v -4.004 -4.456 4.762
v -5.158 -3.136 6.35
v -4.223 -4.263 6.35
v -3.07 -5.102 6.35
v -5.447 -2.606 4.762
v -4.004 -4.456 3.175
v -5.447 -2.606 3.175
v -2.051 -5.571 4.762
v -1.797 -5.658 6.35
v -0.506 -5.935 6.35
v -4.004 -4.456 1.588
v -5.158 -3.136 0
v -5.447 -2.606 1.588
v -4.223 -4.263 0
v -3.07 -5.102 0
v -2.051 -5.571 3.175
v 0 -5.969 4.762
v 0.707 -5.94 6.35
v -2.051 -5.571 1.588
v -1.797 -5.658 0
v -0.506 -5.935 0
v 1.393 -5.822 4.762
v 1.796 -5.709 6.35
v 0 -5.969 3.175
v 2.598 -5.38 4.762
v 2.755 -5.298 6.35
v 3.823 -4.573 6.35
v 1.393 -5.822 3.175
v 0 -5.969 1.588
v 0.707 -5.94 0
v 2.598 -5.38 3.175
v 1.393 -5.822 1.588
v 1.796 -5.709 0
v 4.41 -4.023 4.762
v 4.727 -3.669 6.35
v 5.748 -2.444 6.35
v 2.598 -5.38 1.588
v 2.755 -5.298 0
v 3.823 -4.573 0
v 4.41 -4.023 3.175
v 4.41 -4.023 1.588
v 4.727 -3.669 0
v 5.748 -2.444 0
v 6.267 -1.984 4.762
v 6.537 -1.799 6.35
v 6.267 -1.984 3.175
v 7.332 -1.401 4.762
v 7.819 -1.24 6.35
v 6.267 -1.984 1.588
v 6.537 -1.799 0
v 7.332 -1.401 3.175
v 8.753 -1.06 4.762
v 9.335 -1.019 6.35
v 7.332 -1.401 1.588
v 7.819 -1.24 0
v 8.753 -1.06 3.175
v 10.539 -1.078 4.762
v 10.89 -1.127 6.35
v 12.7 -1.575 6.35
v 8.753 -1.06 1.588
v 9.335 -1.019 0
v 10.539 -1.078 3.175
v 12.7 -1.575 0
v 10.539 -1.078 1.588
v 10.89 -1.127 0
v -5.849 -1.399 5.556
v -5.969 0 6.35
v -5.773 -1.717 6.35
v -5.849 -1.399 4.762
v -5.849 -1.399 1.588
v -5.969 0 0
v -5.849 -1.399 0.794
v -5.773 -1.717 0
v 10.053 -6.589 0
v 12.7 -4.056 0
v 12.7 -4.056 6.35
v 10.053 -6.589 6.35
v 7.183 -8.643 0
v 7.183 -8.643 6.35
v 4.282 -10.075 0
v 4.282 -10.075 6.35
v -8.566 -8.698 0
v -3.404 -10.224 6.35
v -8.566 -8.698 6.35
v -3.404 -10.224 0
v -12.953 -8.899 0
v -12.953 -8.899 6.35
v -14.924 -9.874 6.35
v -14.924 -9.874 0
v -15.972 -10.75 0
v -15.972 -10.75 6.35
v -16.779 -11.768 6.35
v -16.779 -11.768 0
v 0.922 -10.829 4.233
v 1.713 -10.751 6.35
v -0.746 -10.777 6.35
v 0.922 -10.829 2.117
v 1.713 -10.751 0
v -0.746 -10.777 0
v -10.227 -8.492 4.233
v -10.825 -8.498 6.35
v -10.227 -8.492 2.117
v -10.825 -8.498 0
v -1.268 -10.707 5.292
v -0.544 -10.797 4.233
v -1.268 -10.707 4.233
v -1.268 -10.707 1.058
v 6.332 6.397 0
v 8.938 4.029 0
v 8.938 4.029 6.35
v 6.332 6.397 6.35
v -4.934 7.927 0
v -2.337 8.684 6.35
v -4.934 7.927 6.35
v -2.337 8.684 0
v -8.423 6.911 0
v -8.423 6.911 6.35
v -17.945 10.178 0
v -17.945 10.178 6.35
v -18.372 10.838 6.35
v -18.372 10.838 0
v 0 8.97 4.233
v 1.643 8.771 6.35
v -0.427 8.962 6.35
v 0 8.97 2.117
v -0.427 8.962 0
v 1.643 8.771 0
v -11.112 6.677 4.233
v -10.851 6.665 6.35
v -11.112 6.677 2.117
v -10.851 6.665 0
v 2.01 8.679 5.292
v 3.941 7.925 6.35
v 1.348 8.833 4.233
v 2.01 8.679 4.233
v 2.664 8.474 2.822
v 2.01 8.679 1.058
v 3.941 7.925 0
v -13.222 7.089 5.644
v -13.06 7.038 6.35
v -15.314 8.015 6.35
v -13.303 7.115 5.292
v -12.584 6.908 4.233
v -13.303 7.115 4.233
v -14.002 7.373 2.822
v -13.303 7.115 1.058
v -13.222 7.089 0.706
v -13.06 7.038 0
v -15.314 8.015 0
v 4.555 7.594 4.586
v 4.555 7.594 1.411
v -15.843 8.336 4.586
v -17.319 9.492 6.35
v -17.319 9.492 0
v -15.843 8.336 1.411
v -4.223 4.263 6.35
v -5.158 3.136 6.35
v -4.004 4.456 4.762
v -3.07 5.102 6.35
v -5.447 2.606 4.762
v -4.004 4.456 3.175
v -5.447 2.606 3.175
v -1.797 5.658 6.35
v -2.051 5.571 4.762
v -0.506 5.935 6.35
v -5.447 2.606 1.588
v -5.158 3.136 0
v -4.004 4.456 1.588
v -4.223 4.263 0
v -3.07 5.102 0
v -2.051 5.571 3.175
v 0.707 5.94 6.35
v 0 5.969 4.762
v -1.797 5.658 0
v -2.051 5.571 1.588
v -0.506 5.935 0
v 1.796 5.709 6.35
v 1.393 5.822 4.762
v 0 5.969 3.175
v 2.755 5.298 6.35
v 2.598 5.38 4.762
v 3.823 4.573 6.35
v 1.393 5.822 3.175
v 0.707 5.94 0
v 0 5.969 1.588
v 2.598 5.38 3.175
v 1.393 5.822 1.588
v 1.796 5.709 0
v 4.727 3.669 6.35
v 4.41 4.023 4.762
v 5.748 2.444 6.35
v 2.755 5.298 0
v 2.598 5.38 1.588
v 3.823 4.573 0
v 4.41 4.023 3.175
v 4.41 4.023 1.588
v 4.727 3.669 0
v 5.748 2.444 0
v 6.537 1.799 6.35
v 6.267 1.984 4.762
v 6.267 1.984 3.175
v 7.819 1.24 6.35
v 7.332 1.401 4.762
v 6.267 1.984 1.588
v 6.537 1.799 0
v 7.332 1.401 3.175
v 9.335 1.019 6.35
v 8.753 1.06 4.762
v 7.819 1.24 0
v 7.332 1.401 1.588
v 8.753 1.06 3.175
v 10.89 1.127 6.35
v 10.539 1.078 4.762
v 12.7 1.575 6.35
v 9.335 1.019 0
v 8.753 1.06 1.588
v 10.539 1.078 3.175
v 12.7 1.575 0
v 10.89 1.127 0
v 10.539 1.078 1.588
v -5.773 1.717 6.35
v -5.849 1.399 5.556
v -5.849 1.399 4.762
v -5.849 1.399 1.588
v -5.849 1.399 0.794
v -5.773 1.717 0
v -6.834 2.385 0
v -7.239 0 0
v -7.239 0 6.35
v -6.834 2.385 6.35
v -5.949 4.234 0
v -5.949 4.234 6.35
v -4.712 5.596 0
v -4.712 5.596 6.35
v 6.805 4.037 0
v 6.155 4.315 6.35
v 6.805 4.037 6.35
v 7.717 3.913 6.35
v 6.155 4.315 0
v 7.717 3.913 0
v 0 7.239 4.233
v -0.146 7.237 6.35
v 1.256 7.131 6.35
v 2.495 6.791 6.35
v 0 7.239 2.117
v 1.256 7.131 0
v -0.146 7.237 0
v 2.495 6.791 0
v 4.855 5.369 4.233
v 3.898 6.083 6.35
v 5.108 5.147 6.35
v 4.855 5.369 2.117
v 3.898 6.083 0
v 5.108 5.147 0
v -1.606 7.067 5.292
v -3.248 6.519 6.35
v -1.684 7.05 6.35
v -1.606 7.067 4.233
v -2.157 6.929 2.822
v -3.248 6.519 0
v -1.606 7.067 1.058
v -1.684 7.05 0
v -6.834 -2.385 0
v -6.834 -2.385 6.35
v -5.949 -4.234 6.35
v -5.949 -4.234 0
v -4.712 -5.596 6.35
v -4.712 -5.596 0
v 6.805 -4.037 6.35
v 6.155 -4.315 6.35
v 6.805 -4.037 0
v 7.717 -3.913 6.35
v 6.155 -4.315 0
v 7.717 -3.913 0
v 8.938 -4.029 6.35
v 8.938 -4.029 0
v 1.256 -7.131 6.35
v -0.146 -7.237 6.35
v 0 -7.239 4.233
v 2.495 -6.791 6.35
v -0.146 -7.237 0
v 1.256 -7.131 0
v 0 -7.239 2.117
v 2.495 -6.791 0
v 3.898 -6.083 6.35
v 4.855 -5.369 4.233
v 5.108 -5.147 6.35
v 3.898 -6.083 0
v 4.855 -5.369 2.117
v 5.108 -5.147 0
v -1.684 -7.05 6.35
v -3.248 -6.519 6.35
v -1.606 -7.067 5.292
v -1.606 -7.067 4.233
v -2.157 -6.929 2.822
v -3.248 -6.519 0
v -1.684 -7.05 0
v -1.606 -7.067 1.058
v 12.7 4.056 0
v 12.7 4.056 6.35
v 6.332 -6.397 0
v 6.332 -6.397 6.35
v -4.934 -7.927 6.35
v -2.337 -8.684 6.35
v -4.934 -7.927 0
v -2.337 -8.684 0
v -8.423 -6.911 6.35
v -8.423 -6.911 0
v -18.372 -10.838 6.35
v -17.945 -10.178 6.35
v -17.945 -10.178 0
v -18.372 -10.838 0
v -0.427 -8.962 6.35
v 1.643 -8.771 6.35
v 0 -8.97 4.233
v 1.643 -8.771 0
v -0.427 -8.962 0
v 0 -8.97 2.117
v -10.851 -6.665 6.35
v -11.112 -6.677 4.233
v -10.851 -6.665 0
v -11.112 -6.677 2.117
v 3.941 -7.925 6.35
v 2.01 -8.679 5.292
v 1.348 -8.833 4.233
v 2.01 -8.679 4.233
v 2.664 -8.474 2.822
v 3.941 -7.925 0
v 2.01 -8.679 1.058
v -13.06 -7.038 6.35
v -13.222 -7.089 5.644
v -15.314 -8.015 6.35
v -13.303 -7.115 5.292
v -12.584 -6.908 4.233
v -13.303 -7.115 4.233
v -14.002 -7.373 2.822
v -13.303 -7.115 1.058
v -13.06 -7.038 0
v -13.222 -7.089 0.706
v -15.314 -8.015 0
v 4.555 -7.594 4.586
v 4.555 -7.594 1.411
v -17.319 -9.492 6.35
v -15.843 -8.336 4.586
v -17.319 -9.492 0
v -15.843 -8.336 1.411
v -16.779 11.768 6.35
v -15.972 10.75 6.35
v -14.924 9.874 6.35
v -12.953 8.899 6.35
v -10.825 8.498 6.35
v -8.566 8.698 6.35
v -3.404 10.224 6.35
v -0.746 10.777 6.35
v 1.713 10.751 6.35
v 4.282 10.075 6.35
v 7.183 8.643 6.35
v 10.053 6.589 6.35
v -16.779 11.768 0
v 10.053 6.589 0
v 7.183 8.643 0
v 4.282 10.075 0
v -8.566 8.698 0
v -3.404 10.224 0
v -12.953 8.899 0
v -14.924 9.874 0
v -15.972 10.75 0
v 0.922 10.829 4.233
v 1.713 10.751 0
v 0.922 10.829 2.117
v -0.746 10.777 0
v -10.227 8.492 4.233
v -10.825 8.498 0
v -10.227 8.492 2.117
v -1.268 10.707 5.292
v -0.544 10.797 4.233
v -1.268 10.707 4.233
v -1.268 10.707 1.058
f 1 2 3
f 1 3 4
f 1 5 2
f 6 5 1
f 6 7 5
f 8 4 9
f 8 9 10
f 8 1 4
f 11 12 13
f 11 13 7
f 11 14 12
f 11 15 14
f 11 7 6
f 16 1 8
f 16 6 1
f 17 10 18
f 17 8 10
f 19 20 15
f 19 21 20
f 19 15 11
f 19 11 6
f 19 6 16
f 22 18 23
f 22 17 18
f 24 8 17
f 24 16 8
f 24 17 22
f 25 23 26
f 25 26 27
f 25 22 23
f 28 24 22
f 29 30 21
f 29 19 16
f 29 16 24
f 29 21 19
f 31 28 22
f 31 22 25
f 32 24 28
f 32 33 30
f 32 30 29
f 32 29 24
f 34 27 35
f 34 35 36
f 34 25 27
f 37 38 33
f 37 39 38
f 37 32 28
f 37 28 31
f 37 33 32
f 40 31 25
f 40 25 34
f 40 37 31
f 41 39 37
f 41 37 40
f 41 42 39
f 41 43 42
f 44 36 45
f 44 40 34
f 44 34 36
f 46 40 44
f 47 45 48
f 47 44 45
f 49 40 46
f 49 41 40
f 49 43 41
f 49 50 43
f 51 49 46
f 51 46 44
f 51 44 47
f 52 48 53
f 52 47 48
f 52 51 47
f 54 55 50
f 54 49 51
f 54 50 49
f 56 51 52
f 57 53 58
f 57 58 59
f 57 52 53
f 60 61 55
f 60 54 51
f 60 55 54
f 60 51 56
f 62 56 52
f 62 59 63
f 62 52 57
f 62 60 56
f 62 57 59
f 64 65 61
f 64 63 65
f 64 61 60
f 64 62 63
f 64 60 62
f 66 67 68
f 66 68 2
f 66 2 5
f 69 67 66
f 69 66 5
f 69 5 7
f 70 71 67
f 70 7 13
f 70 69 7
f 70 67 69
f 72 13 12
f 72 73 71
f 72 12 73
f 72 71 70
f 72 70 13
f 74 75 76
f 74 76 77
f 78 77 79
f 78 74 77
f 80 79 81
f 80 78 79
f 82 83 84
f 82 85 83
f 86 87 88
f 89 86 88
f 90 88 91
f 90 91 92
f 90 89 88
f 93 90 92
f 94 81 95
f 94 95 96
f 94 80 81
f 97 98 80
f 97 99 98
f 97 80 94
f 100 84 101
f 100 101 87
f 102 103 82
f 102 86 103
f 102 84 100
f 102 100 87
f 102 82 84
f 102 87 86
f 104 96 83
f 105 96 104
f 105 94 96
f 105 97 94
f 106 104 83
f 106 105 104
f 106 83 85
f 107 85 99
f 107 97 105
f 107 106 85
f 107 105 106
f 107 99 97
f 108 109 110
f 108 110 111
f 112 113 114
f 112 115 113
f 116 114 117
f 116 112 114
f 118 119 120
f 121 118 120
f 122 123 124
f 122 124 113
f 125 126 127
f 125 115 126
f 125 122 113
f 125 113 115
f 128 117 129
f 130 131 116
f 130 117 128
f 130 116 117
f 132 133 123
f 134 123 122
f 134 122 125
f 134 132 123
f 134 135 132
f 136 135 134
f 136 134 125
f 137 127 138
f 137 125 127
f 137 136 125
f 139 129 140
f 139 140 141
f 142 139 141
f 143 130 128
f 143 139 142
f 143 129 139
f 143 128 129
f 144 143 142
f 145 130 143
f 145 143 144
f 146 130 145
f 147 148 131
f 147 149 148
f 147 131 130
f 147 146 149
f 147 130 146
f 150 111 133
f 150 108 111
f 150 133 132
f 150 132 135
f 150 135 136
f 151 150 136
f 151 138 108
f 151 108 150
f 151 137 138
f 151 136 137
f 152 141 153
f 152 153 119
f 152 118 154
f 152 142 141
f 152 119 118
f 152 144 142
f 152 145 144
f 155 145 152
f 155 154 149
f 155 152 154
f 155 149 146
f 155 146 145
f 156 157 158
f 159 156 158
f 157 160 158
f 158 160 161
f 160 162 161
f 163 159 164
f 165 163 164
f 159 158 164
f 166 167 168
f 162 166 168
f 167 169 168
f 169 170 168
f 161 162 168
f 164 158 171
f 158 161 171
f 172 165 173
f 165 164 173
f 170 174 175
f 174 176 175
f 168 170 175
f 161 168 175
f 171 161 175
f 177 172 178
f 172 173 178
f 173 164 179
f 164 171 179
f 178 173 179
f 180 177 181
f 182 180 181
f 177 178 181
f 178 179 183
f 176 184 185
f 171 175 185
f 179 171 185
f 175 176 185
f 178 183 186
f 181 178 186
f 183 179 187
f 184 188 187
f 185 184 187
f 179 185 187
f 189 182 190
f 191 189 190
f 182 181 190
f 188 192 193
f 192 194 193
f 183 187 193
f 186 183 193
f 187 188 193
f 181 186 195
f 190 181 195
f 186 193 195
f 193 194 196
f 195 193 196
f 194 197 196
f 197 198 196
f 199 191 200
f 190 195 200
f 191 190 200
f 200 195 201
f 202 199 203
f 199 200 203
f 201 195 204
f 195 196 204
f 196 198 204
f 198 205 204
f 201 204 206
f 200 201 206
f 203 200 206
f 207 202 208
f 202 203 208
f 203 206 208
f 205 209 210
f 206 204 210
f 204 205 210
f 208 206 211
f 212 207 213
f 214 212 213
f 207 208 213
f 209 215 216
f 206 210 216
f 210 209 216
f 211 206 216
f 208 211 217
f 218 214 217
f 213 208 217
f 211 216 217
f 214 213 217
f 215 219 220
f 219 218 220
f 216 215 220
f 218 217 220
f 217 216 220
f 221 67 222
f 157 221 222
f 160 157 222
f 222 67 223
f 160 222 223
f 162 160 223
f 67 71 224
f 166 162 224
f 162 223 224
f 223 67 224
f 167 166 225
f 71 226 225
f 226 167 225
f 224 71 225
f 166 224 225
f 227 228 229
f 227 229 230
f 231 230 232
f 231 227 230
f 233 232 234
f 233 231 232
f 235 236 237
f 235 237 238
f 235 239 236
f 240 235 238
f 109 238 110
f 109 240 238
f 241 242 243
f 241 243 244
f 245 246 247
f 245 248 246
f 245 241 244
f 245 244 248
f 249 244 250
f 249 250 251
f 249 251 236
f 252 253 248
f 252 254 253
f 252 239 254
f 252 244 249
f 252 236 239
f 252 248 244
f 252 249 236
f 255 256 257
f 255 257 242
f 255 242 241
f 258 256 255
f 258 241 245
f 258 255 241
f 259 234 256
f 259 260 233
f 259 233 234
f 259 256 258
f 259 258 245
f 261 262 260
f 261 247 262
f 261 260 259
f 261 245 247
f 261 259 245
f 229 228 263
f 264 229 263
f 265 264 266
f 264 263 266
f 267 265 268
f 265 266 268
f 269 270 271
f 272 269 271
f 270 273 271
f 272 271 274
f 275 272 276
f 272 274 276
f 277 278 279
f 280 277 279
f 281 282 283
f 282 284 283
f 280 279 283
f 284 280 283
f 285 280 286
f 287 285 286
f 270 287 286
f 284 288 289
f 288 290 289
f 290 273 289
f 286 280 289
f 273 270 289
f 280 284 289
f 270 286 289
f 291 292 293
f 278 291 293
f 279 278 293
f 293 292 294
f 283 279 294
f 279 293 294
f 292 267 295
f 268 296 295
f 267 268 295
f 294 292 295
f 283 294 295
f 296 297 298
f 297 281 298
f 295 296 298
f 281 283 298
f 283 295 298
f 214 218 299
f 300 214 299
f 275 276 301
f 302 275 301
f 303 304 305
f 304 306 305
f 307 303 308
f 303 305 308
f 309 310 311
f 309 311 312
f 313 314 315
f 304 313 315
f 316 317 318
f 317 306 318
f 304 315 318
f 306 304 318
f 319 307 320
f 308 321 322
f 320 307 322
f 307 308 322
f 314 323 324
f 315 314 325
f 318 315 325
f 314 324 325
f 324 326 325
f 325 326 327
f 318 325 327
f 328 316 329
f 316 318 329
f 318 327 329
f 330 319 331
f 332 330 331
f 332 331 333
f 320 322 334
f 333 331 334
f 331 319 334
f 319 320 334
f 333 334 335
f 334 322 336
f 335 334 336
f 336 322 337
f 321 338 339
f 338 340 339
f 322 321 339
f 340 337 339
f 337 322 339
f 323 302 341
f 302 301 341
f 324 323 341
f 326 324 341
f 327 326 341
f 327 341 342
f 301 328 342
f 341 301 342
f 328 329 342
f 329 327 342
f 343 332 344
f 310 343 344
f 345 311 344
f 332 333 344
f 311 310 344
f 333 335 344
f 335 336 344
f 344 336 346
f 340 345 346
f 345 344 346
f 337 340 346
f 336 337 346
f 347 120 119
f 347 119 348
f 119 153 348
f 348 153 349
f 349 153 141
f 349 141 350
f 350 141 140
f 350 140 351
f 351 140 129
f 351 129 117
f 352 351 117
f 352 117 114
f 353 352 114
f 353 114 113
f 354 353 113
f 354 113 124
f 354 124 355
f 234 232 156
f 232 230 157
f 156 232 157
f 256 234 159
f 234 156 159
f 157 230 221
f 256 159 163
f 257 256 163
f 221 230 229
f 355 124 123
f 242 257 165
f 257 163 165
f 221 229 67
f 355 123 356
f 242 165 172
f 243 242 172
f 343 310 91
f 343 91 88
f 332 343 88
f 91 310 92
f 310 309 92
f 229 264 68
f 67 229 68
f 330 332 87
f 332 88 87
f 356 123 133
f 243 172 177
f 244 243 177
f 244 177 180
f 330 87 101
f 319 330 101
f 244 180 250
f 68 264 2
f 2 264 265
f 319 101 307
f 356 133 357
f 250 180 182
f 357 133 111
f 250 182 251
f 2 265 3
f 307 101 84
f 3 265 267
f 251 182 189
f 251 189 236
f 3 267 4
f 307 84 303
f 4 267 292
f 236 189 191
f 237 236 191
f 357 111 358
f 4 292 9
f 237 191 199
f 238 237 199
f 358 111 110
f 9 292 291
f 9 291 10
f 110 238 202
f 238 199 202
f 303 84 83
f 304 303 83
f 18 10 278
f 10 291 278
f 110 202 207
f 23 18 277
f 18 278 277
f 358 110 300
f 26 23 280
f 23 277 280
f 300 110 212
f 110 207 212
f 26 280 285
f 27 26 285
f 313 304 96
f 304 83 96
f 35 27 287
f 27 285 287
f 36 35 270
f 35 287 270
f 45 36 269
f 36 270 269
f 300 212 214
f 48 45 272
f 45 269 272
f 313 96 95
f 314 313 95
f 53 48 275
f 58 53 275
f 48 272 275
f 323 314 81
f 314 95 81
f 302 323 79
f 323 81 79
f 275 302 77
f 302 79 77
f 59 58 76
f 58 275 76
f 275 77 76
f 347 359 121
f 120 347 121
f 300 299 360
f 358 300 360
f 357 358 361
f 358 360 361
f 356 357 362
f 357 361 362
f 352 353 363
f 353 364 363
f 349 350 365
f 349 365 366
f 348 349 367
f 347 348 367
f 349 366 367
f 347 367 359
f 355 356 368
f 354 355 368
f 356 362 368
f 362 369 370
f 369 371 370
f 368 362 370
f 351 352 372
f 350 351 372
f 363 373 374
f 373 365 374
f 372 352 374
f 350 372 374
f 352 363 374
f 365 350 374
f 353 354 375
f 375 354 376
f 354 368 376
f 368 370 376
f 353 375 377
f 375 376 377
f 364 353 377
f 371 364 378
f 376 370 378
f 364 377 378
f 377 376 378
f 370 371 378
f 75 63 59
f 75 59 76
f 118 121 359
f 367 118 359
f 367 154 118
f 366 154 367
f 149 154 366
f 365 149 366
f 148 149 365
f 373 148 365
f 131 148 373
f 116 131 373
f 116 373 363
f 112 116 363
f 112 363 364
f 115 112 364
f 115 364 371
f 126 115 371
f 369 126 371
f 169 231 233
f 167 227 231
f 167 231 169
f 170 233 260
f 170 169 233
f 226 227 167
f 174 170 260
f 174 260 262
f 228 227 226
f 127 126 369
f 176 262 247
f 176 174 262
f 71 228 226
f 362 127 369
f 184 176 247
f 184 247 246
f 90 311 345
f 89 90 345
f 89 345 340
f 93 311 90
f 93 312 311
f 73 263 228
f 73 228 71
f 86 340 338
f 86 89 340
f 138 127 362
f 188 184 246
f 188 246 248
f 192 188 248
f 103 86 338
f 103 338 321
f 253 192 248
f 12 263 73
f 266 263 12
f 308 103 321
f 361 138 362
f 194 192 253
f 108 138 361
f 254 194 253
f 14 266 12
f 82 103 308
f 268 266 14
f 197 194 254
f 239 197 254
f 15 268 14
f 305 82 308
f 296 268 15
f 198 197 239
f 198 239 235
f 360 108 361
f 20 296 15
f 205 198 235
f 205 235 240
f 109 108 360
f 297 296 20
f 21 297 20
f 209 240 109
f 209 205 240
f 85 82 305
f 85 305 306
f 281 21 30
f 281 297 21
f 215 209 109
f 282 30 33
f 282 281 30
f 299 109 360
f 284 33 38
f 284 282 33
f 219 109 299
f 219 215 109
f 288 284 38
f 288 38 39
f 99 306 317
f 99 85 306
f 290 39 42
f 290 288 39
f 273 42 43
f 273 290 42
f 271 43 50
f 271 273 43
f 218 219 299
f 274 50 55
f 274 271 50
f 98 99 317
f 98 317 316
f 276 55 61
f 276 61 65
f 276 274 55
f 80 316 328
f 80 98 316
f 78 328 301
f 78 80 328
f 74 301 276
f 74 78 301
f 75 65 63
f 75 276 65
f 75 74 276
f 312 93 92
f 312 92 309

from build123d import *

# Parameters (mm, degrees)
F1_DEPTH = 6.35


with BuildPart() as f1:
    # F0 (on Top) → F1 (new body)
    with BuildSketch(Plane.XY):
        with BuildLine():
            Line((-7.239, 0), (-5.969, 0))
            add(Edge.make_bspline(
                [(-5.969, 0), (-6.0701264503, 3.9867206148), (-0.0083761915, 7.3584527752), (4.614136051, 4.2335375173), (6.0702898283, 1.464032411), (9.5657648794, 0.540955909), (12.7, 1.5748)],
                knots=[0, 0, 0, 0, 0.3123970734, 0.5484634034, 0.7270196615, 1, 1, 1, 1], degree=3))
            Line((12.7, 1.5748), (12.7, 4.0559605695))
            add(Edge.make_bspline(
                [(12.7, 4.0559605695), (9.9085047841, 7.1547813714), (1.0123703559, 13.7321167881), (-9.7640778606, 6.6237279483), (-15.5811811273, 9.8434320102), (-16.7785789818, 11.7678204551)],
                knots=[0, 0, 0, 0, 0.3773724979, 0.7229100201, 1, 1, 1, 1], degree=3))
            Line((-16.7785789818, 11.7678204551), (-18.3722581714, 10.8381742612))
            add(Edge.make_bspline(
                [(8.9377881959, 4.0287543088), (6.5324549964, 6.5471798375), (0.0463203213, 11.4481459639), (-10.6170131969, 4.2283415052), (-17.5346564086, 9.162971663), (-18.3722581714, 10.8381742612)],
                knots=[0, 0, 0, 0, 0.3379245524, 0.6941107255, 1, 1, 1, 1], degree=3))
            add(Edge.make_bspline(
                [(-7.239, 0), (-6.9881934982, 5.4243064071), (-0.1282277524, 8.5236338355), (5.195152461, 5.4997970316), (6.4907502383, 3.5850983113), (8.9377881959, 4.0287543088)],
                knots=[0, 0, 0, 0, 0.4235929884, 0.725564907, 1, 1, 1, 1], degree=3))
        make_face()
    extrude(amount=F1_DEPTH)

    # F2: F1 across plane


with BuildPart() as f1_1:
    add(f1.part)
    add(f1.part.mirror(Plane.XZ))


solid = f1_1.part
